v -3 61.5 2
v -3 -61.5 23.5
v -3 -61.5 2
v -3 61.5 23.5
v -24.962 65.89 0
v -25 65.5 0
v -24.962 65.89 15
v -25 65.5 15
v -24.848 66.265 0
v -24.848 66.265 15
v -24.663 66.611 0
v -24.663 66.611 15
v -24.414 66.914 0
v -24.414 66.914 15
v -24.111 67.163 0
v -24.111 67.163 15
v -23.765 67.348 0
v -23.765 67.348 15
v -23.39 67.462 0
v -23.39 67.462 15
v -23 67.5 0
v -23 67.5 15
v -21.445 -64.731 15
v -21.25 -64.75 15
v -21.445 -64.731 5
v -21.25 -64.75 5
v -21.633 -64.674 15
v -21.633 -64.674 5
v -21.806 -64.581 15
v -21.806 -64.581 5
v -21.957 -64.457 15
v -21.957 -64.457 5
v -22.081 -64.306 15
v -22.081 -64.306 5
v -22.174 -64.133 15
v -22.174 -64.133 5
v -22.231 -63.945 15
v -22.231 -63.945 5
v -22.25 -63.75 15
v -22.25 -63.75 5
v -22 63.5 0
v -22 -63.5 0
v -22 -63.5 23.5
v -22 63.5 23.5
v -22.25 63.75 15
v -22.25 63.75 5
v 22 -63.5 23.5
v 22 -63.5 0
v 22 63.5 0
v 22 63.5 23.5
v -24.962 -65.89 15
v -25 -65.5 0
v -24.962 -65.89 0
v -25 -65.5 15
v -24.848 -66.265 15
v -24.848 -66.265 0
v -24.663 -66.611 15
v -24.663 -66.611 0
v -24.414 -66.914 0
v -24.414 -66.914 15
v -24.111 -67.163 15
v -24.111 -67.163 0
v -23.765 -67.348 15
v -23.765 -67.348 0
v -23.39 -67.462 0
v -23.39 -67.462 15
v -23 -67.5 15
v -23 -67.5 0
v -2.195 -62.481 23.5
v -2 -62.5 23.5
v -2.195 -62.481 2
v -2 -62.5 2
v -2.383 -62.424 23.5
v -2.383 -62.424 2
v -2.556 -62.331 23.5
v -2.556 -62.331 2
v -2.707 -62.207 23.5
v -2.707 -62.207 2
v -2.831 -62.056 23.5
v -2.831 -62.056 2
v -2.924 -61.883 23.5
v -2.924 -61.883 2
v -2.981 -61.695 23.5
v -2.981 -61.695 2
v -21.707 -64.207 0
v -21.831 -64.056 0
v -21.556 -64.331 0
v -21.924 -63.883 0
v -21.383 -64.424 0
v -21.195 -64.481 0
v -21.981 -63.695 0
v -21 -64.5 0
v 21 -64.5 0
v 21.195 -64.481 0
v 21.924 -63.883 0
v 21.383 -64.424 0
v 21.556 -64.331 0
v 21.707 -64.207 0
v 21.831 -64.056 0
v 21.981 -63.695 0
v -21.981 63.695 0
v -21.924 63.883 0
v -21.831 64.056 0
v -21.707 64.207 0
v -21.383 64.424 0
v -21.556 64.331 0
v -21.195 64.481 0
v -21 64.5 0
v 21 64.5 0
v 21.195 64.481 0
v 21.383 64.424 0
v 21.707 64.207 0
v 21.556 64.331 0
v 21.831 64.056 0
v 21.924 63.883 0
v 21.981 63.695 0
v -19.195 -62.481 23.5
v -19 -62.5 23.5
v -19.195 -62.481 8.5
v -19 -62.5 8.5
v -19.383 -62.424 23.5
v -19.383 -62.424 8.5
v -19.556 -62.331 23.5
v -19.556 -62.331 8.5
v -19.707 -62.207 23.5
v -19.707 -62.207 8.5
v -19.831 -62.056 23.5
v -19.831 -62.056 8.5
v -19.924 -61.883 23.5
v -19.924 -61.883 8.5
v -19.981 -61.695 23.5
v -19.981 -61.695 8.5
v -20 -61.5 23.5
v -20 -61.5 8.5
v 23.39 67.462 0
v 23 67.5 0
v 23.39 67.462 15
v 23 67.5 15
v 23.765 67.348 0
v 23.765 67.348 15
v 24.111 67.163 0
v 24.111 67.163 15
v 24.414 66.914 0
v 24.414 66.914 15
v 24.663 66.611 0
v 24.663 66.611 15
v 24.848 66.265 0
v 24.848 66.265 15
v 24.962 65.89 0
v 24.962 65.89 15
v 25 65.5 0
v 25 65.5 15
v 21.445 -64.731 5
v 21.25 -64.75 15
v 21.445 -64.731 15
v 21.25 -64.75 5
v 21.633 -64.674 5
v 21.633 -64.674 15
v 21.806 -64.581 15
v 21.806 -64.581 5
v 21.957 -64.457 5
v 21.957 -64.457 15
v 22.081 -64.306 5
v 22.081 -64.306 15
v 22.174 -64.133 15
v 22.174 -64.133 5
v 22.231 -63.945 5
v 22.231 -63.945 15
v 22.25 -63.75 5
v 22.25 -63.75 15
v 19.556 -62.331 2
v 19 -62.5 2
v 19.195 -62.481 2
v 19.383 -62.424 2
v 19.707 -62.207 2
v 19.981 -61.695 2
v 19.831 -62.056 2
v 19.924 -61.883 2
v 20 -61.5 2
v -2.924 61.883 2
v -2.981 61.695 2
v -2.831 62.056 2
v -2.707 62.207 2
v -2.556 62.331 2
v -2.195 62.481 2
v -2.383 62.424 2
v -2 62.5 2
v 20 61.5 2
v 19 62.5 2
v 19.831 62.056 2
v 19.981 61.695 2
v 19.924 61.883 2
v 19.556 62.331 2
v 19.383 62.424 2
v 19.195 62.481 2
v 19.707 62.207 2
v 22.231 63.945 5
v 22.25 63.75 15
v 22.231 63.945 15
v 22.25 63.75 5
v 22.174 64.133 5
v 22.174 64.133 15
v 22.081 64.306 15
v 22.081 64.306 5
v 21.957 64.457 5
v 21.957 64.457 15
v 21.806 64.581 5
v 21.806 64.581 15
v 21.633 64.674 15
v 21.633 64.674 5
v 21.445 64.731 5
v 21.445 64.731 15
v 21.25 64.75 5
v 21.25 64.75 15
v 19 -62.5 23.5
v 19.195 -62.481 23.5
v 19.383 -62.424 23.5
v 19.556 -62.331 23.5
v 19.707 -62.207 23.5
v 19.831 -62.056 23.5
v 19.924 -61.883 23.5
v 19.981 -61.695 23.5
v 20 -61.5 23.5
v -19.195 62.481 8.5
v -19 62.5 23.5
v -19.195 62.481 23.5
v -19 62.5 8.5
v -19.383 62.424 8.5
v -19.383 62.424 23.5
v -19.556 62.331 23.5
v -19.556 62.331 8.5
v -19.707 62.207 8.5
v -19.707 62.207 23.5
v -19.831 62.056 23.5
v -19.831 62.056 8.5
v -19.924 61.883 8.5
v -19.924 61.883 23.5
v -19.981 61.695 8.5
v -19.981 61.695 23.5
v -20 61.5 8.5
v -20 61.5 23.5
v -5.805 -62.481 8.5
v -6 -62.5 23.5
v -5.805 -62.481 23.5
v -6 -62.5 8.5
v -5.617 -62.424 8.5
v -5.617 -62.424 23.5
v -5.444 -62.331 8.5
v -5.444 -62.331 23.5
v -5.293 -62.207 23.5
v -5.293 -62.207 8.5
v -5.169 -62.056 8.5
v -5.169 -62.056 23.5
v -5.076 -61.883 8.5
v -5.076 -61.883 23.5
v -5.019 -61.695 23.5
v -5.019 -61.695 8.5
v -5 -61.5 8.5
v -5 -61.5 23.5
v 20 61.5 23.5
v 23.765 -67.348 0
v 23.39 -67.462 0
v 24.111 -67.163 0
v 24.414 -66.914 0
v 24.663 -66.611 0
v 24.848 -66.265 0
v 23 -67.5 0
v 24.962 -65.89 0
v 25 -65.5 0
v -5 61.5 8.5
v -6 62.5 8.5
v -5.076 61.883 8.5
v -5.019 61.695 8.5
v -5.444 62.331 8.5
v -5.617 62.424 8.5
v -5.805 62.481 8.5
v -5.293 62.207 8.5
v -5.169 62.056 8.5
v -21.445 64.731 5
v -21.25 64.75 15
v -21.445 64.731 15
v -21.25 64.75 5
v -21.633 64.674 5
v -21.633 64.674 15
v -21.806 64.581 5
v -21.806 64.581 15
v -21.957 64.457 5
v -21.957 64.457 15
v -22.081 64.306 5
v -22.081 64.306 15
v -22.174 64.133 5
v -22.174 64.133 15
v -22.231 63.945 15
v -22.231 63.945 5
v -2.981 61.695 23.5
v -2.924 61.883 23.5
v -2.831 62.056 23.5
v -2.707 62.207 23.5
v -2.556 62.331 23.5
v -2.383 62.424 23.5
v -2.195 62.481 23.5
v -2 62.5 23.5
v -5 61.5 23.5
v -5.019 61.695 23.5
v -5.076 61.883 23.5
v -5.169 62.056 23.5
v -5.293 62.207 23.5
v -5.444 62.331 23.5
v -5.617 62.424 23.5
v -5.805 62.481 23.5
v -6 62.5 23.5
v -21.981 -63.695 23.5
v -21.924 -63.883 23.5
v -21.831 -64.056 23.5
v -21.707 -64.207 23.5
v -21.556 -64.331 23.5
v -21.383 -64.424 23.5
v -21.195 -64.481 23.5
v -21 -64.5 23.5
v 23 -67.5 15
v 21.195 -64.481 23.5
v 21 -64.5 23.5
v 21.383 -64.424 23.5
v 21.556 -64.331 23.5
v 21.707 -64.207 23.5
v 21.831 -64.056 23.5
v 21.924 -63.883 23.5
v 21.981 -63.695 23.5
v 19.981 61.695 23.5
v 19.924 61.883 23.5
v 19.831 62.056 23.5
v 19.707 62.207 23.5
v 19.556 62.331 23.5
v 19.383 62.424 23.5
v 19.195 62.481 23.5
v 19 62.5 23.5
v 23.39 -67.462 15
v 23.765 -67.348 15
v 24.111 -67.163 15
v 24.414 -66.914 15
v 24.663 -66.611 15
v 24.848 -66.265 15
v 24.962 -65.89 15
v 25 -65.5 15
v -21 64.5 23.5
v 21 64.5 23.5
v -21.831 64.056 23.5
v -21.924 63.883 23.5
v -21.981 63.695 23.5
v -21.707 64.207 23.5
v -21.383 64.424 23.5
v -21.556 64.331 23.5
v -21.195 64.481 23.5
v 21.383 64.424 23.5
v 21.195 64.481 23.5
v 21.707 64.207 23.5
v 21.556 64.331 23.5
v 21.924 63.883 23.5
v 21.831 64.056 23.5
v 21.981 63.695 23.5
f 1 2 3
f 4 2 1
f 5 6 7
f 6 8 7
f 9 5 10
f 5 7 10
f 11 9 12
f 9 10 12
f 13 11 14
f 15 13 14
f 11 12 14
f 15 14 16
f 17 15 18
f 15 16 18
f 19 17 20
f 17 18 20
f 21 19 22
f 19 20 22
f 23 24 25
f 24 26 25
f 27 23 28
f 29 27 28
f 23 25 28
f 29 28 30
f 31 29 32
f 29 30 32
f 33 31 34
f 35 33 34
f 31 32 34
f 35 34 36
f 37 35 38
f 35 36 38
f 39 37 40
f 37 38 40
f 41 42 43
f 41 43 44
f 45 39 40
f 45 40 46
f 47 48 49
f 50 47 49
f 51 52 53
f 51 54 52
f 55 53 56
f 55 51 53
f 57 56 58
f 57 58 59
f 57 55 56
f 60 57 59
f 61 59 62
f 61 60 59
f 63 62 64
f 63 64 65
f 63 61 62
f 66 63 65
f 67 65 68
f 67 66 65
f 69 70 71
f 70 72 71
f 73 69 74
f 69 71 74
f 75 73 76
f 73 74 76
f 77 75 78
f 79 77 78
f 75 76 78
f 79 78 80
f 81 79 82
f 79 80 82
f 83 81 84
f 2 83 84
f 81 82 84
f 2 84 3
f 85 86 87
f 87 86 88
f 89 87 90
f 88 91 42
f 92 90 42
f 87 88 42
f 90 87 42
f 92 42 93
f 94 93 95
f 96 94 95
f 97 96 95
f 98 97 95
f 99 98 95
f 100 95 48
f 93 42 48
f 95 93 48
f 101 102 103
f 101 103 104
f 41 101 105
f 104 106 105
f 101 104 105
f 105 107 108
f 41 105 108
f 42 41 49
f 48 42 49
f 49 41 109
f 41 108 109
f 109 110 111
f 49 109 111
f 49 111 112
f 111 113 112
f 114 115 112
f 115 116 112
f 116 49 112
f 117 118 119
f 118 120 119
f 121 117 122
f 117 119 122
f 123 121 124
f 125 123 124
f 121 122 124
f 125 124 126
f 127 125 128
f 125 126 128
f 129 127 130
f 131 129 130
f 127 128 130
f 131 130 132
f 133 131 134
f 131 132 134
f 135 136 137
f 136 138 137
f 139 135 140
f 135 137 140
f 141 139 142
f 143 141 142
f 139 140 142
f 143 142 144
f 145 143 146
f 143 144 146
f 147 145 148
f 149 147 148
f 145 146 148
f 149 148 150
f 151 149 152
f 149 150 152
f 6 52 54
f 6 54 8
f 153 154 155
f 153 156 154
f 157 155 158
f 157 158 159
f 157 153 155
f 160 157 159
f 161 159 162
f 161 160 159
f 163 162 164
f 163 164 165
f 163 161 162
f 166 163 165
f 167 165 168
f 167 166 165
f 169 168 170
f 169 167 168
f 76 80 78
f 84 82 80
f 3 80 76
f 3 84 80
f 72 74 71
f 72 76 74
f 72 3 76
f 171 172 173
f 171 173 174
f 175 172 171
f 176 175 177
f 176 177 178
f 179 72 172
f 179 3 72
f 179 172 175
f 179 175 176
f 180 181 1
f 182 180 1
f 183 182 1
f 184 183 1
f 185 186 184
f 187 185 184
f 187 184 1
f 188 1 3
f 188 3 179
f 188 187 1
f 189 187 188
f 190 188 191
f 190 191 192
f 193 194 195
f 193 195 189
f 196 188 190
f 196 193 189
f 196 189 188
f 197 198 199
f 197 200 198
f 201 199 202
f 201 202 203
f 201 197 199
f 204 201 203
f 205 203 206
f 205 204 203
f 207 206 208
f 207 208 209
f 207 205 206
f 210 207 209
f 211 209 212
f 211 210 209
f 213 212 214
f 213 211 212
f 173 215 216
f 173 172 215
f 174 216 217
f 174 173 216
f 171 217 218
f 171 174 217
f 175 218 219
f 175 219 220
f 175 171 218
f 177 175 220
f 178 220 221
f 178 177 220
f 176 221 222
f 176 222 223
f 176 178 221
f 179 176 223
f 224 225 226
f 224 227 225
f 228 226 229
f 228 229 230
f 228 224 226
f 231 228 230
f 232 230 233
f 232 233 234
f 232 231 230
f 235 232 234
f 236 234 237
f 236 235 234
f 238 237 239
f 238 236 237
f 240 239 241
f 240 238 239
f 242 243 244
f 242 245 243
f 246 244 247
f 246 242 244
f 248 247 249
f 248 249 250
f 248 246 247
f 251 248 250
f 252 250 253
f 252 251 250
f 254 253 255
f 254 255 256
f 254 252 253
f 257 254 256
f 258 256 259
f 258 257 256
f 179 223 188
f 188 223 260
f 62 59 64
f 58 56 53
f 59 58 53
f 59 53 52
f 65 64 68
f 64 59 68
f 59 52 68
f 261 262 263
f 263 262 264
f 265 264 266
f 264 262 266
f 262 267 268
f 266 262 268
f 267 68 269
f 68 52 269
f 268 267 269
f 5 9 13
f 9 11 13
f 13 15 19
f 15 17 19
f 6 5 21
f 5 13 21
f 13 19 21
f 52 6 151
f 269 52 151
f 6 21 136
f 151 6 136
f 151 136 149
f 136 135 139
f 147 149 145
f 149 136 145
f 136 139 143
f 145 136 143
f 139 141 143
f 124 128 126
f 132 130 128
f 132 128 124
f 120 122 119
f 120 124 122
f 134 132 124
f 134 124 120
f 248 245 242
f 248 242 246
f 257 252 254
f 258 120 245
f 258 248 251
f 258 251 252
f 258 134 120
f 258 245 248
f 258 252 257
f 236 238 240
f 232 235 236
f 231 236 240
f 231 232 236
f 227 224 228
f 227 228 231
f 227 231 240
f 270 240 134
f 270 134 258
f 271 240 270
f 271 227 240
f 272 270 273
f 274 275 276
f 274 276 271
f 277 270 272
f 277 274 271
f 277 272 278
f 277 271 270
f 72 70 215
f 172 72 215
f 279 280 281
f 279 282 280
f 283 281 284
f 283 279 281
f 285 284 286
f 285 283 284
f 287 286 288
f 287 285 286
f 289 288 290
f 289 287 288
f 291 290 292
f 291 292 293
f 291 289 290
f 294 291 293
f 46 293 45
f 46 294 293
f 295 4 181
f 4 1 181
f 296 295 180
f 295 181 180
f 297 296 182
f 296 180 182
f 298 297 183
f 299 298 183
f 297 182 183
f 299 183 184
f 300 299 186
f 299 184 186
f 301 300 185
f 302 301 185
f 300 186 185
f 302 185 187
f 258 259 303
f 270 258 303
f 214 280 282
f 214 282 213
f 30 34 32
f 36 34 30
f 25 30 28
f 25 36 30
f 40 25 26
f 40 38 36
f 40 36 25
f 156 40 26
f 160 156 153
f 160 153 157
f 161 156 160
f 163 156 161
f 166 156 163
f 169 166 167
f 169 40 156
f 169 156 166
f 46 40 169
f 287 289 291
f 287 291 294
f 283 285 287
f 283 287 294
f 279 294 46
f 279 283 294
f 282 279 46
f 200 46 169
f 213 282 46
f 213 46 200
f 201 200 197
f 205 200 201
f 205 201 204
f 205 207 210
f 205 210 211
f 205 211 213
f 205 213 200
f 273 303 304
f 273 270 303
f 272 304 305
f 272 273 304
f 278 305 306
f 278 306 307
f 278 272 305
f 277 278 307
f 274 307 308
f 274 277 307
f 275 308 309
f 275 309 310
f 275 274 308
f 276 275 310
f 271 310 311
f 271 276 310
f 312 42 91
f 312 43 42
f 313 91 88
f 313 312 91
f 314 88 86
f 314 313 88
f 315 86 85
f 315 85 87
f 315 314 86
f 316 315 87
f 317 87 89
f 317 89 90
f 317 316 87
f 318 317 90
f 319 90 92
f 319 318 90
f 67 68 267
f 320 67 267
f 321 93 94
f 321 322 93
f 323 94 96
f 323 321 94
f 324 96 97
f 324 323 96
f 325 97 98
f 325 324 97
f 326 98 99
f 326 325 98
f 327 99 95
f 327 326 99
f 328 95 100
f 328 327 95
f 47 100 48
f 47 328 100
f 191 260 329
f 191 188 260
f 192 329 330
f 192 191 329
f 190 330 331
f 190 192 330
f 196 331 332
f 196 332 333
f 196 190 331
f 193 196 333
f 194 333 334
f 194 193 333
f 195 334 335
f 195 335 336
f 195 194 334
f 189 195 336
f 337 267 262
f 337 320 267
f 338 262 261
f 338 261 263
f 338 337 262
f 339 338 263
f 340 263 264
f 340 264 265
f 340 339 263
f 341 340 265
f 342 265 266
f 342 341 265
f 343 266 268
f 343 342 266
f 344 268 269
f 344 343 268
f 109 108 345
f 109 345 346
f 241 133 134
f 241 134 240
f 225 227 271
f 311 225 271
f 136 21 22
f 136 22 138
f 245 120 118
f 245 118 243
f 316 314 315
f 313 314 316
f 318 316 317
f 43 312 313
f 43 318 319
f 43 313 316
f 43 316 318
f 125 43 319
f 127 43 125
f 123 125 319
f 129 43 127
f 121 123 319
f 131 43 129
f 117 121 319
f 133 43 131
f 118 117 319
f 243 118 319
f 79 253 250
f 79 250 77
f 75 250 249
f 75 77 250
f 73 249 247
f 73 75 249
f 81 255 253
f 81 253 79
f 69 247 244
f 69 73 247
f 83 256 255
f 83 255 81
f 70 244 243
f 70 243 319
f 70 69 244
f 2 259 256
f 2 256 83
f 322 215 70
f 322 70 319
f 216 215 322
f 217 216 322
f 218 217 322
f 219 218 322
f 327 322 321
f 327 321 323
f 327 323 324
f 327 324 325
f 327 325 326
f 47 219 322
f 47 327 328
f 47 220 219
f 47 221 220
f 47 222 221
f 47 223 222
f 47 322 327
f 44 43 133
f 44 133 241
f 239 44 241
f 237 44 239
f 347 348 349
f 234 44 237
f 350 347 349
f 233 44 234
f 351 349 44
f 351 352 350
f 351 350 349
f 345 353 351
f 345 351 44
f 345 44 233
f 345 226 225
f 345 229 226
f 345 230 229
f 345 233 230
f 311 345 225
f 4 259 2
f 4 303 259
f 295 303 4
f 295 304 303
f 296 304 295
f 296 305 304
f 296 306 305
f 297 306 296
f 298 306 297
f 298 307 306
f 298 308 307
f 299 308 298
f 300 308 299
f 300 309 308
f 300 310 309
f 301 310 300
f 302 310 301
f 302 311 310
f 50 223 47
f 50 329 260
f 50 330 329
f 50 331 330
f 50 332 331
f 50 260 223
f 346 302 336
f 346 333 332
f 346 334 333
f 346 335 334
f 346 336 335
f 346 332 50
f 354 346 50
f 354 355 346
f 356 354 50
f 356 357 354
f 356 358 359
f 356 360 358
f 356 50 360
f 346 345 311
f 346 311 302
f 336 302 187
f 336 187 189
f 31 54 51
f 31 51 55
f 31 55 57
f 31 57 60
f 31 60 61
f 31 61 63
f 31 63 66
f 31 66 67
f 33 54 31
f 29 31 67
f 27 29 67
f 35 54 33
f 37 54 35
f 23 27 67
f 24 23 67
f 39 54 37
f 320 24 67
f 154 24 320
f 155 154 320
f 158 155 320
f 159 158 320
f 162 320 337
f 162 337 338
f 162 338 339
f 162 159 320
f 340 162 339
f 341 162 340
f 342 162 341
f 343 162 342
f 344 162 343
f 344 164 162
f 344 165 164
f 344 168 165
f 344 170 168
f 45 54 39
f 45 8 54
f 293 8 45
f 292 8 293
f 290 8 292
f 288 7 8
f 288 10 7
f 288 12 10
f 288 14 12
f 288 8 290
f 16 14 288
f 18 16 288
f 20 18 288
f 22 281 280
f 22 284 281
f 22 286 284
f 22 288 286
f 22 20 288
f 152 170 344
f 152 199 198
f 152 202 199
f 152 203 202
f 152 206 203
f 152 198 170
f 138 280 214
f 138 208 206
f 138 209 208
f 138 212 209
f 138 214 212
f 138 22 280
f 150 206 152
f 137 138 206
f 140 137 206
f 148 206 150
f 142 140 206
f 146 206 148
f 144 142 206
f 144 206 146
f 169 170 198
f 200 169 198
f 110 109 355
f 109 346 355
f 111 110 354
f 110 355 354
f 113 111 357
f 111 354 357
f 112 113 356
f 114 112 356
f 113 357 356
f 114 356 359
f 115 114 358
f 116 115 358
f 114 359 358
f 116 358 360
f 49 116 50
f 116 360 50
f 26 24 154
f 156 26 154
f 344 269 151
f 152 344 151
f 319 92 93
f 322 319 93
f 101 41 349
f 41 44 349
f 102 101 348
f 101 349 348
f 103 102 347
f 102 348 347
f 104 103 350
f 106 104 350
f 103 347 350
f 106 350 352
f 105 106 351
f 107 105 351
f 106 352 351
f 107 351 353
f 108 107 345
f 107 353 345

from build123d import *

# Parameters (mm, degrees)
SKETCH_W        = 44
SKETCH_H        = 129
PAD_DEPTH       = 23.5
SKETCH001_W     = 23
SKETCH001_H     = 125
POCKET_DEPTH    = 21.5
SKETCH002_W     = 15
SKETCH002_H     = 125
POCKET001_DEPTH = 15
FILLET002_R     = 1
FILLET003_R     = 1
FILLET004_R     = 1
SKETCH003_W     = 50
SKETCH003_H     = 135
PAD001_DEPTH    = 15
SKETCH004_W     = 44.5
SKETCH004_H     = 129.5
POCKET002_DEPTH = 10
FILLET_R        = 2
FILLET001_R     = 1


with BuildPart() as body:
    # Sketch → Pad (new body)
    with BuildSketch(Plane.XY):
        Rectangle(SKETCH_W, SKETCH_H)
    extrude(amount=PAD_DEPTH)

    # Sketch001 (on Face6 of Pad) → Pocket (cut)
    with BuildSketch(Plane.XY.offset(23.5)):
        with Locations((8.5, 0)):
            Rectangle(SKETCH001_W, SKETCH001_H)
    extrude(amount=-POCKET_DEPTH, mode=Mode.SUBTRACT)

    # Sketch002 (on Face5 of Pocket) → Pocket001 (cut)
    with BuildSketch(Plane.XY.offset(23.5)):
        with Locations((-12.5, 0)):
            Rectangle(SKETCH002_W, SKETCH002_H)
    extrude(amount=-POCKET001_DEPTH, mode=Mode.SUBTRACT)

    # Fillet002
    fillet002_edges = [body.edges().sort_by_distance(p)[0] for p in [
        (22, -64.5, 11.75),
        (-22, -64.5, 11.75),
        (22, 64.5, 11.75),
        (-22, 64.5, 11.75),
    ]]
    fillet(fillet002_edges, radius=FILLET002_R)

    # Fillet003
    fillet003_edges = [body.edges().sort_by_distance(p)[0] for p in [
        (-5, 62.5, 16),
        (-20, 62.5, 16),
        (-20, -62.5, 16),
        (-5, -62.5, 16),
    ]]
    fillet(fillet003_edges, radius=FILLET003_R)

    # Fillet004
    fillet004_edges = [body.edges().sort_by_distance(p)[0] for p in [
        (-3, -62.5, 12.75),
        (20, -62.5, 12.75),
        (20, 62.5, 12.75),
        (-3, 62.5, 12.75),
    ]]
    fillet(fillet004_edges, radius=FILLET004_R)


with BuildPart() as top:
    # Sketch003 → Pad001 (new body)
    with BuildSketch(Plane.XY):
        Rectangle(SKETCH003_W, SKETCH003_H)
    extrude(amount=PAD001_DEPTH)

    # Sketch004 (on Face6 of Pad001) → Pocket002 (cut)
    with BuildSketch(Plane.XY.offset(15)):
        Rectangle(SKETCH004_W, SKETCH004_H)
    extrude(amount=-POCKET002_DEPTH, mode=Mode.SUBTRACT)

    # Fillet
    fillet_edges = [top.edges().sort_by_distance(p)[0] for p in [
        (25, -67.5, 7.5),
        (-25, -67.5, 7.5),
        (-25, 67.5, 7.5),
        (25, 67.5, 7.5),
    ]]
    fillet(fillet_edges, radius=FILLET_R)

    # Fillet001
    fillet001_edges = [top.edges().sort_by_distance(p)[0] for p in [
        (22.25, -64.75, 10),
        (-22.25, -64.75, 10),
        (22.25, 64.75, 10),
        (-22.25, 64.75, 10),
    ]]
    fillet(fillet001_edges, radius=FILLET001_R)


solid = Compound([body.part, top.part])
